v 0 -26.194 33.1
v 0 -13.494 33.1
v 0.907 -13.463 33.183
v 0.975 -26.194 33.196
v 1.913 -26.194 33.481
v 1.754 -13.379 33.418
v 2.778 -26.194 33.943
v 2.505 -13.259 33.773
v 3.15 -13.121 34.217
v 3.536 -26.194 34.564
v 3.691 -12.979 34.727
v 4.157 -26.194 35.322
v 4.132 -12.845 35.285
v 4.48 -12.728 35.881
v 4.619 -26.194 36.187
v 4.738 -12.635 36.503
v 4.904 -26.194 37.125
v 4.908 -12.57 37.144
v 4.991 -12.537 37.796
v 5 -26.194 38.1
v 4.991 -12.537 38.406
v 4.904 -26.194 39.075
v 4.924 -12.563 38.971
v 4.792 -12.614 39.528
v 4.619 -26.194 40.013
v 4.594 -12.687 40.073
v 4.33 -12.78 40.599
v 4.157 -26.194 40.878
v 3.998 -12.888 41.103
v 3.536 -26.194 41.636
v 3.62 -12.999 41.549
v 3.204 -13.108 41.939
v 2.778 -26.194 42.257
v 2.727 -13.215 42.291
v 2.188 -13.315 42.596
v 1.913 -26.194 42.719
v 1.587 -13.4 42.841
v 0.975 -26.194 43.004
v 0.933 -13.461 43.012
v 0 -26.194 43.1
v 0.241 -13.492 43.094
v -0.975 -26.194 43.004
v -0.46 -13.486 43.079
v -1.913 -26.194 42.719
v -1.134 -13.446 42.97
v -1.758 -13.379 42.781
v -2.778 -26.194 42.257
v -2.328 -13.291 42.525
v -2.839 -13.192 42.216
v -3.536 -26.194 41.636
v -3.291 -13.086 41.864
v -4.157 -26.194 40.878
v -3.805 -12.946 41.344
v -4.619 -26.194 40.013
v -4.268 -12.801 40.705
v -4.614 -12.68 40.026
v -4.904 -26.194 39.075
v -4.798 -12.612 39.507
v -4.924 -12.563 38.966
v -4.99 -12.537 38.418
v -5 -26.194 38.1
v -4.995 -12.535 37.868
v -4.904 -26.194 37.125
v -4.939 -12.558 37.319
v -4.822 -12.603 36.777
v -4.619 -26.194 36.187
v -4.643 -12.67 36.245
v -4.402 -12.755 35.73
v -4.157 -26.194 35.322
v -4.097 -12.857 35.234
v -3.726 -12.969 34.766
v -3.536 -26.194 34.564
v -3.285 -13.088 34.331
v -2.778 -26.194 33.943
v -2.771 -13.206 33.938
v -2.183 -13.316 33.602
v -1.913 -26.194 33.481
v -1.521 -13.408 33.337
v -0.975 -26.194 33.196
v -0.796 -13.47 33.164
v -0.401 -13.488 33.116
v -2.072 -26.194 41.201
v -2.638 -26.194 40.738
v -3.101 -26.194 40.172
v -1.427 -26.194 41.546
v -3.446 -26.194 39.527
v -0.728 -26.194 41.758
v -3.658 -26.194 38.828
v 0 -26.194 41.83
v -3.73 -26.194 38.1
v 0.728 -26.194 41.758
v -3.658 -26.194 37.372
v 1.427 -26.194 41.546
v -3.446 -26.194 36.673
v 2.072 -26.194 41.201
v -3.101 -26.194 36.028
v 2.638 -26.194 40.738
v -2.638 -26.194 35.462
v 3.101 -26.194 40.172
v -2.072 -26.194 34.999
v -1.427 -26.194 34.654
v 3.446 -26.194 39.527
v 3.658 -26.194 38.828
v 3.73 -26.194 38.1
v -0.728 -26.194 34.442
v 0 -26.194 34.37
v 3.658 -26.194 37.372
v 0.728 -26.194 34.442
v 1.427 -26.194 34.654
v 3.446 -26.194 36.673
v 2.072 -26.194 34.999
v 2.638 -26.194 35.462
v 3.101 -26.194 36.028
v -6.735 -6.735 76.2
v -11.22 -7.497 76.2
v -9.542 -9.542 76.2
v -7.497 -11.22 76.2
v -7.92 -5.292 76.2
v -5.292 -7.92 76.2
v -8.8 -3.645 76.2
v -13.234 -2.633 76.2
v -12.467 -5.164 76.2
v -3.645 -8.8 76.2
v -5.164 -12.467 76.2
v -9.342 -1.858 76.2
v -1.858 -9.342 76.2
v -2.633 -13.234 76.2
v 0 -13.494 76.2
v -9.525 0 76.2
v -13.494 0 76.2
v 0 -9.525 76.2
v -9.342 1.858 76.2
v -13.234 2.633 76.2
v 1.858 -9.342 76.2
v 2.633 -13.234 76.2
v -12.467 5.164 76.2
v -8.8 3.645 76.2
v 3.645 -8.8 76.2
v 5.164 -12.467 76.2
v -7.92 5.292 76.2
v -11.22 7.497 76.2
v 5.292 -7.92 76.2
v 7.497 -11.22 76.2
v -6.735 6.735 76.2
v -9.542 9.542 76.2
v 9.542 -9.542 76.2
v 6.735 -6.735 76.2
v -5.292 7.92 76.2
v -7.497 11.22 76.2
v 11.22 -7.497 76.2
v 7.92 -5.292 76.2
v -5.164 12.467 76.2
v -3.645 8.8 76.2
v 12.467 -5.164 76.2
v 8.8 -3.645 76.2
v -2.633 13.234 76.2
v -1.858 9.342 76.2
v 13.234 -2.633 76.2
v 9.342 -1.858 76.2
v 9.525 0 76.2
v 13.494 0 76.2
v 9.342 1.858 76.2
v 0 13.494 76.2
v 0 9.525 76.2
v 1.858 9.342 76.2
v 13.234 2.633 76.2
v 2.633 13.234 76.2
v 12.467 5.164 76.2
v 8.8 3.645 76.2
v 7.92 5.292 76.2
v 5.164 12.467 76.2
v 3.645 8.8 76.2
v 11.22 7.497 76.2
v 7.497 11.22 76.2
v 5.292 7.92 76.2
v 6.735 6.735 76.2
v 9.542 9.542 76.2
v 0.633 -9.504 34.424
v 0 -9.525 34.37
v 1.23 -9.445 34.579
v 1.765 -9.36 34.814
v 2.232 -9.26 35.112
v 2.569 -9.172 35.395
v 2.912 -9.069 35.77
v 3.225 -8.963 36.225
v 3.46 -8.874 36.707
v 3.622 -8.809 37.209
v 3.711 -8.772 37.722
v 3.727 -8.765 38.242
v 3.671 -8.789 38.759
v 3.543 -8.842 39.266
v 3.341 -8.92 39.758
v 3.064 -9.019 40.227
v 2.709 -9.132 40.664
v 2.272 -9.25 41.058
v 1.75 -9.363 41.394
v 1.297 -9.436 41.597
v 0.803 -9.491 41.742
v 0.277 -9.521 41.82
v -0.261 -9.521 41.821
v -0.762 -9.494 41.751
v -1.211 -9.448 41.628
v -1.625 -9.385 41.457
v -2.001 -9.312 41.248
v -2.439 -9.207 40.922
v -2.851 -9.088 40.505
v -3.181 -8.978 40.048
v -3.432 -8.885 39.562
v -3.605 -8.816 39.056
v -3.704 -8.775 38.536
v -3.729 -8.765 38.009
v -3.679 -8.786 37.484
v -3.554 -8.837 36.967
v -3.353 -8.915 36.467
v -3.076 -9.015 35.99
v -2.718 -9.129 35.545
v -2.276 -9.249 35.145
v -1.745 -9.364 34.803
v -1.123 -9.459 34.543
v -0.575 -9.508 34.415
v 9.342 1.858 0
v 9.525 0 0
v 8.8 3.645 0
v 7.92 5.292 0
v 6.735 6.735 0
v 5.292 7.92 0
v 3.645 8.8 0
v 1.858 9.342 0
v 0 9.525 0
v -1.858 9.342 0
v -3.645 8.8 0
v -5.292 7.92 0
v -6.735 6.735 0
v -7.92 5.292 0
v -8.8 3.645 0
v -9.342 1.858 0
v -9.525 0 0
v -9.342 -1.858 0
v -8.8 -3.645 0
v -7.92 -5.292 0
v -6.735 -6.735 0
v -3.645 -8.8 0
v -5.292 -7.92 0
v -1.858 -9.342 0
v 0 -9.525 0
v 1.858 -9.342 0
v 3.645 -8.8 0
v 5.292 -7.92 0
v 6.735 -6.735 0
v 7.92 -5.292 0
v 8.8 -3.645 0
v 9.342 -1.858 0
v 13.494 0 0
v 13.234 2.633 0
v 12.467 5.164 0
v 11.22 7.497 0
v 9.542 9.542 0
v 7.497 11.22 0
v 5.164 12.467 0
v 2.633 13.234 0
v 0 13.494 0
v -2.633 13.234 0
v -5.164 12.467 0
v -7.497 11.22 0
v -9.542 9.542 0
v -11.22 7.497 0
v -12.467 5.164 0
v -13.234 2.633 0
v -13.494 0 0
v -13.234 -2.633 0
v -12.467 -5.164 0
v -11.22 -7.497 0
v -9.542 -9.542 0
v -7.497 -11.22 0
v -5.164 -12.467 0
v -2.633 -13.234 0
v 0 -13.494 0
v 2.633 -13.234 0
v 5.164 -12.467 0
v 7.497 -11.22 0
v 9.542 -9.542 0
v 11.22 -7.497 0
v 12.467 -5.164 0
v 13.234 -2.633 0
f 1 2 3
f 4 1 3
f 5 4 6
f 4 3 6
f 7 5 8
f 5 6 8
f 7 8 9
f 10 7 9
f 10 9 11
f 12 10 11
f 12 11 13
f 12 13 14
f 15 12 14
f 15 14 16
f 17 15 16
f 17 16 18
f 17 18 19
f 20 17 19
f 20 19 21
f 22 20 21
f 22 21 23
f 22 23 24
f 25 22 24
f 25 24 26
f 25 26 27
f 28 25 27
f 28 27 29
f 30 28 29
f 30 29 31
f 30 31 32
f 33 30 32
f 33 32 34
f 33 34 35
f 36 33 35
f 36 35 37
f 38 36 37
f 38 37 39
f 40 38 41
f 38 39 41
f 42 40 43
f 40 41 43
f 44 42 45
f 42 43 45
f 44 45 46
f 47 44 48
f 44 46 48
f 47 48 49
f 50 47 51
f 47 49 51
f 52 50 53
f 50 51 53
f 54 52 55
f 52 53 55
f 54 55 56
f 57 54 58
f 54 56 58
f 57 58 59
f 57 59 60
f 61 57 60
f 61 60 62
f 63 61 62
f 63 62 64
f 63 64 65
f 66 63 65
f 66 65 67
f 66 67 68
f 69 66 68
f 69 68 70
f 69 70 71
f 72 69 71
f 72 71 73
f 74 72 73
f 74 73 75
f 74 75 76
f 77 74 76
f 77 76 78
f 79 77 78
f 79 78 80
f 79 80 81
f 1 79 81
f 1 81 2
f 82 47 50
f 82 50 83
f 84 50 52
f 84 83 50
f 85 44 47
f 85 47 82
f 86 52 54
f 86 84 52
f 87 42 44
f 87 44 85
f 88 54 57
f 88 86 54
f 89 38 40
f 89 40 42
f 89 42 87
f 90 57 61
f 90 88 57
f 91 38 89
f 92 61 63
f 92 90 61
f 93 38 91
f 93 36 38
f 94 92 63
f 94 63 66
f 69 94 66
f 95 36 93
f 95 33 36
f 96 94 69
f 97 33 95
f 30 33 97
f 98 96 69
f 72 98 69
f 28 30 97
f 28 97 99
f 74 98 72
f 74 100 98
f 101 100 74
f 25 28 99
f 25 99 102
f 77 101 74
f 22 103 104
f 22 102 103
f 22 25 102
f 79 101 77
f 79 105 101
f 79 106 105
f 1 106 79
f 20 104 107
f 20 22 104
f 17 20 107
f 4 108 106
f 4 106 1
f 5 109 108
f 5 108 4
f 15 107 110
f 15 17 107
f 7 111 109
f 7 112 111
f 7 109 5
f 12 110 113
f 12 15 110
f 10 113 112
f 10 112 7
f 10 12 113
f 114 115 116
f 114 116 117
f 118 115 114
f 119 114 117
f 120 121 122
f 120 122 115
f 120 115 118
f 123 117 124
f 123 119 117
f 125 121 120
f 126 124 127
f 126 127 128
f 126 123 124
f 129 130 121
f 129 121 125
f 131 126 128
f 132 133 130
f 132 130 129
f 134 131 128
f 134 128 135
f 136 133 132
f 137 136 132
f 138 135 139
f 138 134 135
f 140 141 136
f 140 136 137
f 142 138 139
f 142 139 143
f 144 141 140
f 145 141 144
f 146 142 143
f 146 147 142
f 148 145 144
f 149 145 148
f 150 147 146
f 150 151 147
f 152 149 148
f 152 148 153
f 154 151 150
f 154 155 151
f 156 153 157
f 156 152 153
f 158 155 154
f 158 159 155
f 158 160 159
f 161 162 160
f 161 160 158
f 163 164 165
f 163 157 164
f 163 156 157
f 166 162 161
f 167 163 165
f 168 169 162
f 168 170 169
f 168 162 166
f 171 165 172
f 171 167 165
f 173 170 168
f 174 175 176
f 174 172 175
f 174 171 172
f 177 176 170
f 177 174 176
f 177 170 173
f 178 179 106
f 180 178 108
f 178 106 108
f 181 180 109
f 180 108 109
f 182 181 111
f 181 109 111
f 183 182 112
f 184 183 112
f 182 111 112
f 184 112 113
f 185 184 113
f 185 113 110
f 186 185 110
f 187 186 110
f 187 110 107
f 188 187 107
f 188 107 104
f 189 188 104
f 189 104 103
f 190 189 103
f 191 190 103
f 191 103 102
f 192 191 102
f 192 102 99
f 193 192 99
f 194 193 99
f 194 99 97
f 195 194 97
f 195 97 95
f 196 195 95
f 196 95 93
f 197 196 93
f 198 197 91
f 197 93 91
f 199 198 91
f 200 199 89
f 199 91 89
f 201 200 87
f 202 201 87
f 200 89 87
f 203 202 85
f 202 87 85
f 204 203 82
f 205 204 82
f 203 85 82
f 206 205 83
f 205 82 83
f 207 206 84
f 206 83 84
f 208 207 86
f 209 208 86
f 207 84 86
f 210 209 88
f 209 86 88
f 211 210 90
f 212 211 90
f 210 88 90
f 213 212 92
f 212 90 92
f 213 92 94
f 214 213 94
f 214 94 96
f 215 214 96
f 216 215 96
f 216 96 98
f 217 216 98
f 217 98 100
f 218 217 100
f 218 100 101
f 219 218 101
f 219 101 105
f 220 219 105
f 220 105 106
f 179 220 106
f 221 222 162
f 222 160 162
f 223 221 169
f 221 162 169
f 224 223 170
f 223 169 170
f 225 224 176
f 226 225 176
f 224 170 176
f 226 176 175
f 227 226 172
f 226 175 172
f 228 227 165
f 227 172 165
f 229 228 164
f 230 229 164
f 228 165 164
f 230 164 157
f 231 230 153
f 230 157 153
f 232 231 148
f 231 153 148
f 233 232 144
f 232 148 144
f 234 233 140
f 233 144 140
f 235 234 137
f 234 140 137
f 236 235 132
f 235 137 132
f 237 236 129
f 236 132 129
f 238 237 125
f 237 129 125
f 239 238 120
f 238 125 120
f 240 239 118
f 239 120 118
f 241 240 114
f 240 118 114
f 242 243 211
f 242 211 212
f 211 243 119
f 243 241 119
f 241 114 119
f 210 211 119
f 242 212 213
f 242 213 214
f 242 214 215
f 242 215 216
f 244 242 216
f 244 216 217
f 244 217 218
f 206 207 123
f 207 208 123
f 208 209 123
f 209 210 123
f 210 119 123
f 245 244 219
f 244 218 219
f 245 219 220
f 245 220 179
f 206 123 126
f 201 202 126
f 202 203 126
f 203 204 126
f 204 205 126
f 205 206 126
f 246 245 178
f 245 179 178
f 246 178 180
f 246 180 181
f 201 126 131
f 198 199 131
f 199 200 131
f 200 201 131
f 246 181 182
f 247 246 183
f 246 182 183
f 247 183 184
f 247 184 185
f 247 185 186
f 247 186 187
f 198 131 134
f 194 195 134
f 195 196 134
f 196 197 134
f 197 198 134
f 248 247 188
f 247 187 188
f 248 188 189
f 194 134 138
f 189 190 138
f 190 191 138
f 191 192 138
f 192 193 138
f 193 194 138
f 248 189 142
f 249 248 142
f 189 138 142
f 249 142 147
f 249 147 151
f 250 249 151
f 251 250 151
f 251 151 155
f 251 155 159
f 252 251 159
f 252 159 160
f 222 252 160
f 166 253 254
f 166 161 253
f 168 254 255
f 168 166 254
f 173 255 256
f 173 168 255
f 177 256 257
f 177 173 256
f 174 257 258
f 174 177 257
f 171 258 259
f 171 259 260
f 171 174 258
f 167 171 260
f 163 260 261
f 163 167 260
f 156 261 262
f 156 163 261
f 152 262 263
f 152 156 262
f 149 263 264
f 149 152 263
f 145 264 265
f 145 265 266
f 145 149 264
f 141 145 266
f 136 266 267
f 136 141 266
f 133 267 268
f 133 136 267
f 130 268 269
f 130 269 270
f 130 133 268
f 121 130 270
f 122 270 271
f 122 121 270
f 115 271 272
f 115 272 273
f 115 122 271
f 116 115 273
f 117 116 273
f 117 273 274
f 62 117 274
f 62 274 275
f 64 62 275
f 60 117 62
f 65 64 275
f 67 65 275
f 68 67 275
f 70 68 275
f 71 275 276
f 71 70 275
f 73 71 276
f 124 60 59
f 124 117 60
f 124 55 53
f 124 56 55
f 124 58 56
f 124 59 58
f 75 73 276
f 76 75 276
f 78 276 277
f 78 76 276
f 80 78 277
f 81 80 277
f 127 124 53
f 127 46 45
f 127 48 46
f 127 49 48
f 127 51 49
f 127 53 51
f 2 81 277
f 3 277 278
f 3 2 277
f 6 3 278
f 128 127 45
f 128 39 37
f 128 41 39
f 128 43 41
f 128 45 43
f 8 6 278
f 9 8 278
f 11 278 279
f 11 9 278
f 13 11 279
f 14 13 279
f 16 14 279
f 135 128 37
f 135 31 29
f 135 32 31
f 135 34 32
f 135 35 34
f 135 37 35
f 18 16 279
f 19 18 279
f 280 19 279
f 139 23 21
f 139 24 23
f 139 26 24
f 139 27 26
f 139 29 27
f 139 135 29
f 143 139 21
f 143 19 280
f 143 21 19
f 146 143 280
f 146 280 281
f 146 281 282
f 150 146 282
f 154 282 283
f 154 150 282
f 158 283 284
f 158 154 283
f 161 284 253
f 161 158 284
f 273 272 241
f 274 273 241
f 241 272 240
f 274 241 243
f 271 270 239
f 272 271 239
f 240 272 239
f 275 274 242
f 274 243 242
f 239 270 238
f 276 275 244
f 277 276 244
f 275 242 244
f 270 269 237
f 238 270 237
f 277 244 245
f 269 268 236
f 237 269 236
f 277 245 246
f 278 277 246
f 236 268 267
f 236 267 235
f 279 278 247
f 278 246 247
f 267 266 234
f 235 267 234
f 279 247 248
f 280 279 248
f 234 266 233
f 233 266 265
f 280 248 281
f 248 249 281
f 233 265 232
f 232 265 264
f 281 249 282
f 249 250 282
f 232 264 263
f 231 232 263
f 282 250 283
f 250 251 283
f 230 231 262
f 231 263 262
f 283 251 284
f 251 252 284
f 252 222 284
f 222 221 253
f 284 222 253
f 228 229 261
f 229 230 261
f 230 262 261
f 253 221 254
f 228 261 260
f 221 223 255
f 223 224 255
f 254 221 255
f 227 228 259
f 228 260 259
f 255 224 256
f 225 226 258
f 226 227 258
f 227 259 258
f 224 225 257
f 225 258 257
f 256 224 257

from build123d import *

# Parameters (mm, degrees)
SWEEP1_PROFILE_R         = 13.49375
CUT_SWEEP1_PROFILE_R     = 9.525
BOSS_EXTRUDE2_DEPTH      = 12.7
BOSS_EXTRUDE2_DEPTH_BACK = 2.54
SKETCH2_R                = 5
CUT_EXTRUDE1_REACH       = 88.969
CUT_EXTRUDE1_END_RADIUS  = 9.525
SKETCH3_R                = 3.73


with BuildPart() as part:
    # Sweep1: sweep along a curve in space
    with BuildLine() as sweep1_path:
        Line((0, 0, 0), (0, 0, 76.2))
    # Sweep1 profile (on start of the path) → Sweep1 (sweep)
    with BuildSketch(Plane.XY):
        Circle(SWEEP1_PROFILE_R)
    sweep(path=sweep1_path.line)

    # Cut-Sweep1: sweep along a curve in space
    with BuildLine() as cut_sweep1_path:
        Line((0, 0, 0), (0, 0, 76.2))
    # Cut-Sweep1 profile (on start of the path) → Cut-Sweep1 (sweep, cut)
    with BuildSketch(Plane.XY):
        Circle(CUT_SWEEP1_PROFILE_R)
    sweep(path=cut_sweep1_path.line, mode=Mode.SUBTRACT)

    # Sketch2 → Boss-Extrude2 (add, two sides: drawn at the far end of the back side and taken through both)
    with BuildSketch(Plane(origin=(0, -13.49375, 0), x_dir=(-1, 0, 0), z_dir=(0, -1, 0)).offset(-BOSS_EXTRUDE2_DEPTH_BACK)):
        with Locations(Location((0, -38.1, 0), (0, 0, 90))):
            Circle(SKETCH2_R)
    extrude(amount=BOSS_EXTRUDE2_DEPTH + BOSS_EXTRUDE2_DEPTH_BACK)

    # Cut-Extrude1: up to this cylinder (the profile starts outside it)
    cut_extrude1_end = Plane(origin=(0, 0, 38.1), z_dir=(0, 0, 1)) * Cylinder(CUT_EXTRUDE1_END_RADIUS, 197.988, mode=Mode.PRIVATE)
    # Sketch3 → Cut-Extrude1 (cut, up to the surface)
    with BuildSketch(Plane.XZ.offset(26.19375), mode=Mode.PRIVATE) as cut_extrude1_sk1:
        with Locations(Location((0, 38.1, 0), (0, 0, 270))):
            Circle(SKETCH3_R)
    cut_extrude1_tool1 = extrude(cut_extrude1_sk1.sketch, amount=-CUT_EXTRUDE1_REACH, mode=Mode.PRIVATE) - cut_extrude1_end
    add(cut_extrude1_tool1.solids().sort_by_distance((0, -26.19375, 38.1))[0], mode=Mode.SUBTRACT)


solid = part.part
